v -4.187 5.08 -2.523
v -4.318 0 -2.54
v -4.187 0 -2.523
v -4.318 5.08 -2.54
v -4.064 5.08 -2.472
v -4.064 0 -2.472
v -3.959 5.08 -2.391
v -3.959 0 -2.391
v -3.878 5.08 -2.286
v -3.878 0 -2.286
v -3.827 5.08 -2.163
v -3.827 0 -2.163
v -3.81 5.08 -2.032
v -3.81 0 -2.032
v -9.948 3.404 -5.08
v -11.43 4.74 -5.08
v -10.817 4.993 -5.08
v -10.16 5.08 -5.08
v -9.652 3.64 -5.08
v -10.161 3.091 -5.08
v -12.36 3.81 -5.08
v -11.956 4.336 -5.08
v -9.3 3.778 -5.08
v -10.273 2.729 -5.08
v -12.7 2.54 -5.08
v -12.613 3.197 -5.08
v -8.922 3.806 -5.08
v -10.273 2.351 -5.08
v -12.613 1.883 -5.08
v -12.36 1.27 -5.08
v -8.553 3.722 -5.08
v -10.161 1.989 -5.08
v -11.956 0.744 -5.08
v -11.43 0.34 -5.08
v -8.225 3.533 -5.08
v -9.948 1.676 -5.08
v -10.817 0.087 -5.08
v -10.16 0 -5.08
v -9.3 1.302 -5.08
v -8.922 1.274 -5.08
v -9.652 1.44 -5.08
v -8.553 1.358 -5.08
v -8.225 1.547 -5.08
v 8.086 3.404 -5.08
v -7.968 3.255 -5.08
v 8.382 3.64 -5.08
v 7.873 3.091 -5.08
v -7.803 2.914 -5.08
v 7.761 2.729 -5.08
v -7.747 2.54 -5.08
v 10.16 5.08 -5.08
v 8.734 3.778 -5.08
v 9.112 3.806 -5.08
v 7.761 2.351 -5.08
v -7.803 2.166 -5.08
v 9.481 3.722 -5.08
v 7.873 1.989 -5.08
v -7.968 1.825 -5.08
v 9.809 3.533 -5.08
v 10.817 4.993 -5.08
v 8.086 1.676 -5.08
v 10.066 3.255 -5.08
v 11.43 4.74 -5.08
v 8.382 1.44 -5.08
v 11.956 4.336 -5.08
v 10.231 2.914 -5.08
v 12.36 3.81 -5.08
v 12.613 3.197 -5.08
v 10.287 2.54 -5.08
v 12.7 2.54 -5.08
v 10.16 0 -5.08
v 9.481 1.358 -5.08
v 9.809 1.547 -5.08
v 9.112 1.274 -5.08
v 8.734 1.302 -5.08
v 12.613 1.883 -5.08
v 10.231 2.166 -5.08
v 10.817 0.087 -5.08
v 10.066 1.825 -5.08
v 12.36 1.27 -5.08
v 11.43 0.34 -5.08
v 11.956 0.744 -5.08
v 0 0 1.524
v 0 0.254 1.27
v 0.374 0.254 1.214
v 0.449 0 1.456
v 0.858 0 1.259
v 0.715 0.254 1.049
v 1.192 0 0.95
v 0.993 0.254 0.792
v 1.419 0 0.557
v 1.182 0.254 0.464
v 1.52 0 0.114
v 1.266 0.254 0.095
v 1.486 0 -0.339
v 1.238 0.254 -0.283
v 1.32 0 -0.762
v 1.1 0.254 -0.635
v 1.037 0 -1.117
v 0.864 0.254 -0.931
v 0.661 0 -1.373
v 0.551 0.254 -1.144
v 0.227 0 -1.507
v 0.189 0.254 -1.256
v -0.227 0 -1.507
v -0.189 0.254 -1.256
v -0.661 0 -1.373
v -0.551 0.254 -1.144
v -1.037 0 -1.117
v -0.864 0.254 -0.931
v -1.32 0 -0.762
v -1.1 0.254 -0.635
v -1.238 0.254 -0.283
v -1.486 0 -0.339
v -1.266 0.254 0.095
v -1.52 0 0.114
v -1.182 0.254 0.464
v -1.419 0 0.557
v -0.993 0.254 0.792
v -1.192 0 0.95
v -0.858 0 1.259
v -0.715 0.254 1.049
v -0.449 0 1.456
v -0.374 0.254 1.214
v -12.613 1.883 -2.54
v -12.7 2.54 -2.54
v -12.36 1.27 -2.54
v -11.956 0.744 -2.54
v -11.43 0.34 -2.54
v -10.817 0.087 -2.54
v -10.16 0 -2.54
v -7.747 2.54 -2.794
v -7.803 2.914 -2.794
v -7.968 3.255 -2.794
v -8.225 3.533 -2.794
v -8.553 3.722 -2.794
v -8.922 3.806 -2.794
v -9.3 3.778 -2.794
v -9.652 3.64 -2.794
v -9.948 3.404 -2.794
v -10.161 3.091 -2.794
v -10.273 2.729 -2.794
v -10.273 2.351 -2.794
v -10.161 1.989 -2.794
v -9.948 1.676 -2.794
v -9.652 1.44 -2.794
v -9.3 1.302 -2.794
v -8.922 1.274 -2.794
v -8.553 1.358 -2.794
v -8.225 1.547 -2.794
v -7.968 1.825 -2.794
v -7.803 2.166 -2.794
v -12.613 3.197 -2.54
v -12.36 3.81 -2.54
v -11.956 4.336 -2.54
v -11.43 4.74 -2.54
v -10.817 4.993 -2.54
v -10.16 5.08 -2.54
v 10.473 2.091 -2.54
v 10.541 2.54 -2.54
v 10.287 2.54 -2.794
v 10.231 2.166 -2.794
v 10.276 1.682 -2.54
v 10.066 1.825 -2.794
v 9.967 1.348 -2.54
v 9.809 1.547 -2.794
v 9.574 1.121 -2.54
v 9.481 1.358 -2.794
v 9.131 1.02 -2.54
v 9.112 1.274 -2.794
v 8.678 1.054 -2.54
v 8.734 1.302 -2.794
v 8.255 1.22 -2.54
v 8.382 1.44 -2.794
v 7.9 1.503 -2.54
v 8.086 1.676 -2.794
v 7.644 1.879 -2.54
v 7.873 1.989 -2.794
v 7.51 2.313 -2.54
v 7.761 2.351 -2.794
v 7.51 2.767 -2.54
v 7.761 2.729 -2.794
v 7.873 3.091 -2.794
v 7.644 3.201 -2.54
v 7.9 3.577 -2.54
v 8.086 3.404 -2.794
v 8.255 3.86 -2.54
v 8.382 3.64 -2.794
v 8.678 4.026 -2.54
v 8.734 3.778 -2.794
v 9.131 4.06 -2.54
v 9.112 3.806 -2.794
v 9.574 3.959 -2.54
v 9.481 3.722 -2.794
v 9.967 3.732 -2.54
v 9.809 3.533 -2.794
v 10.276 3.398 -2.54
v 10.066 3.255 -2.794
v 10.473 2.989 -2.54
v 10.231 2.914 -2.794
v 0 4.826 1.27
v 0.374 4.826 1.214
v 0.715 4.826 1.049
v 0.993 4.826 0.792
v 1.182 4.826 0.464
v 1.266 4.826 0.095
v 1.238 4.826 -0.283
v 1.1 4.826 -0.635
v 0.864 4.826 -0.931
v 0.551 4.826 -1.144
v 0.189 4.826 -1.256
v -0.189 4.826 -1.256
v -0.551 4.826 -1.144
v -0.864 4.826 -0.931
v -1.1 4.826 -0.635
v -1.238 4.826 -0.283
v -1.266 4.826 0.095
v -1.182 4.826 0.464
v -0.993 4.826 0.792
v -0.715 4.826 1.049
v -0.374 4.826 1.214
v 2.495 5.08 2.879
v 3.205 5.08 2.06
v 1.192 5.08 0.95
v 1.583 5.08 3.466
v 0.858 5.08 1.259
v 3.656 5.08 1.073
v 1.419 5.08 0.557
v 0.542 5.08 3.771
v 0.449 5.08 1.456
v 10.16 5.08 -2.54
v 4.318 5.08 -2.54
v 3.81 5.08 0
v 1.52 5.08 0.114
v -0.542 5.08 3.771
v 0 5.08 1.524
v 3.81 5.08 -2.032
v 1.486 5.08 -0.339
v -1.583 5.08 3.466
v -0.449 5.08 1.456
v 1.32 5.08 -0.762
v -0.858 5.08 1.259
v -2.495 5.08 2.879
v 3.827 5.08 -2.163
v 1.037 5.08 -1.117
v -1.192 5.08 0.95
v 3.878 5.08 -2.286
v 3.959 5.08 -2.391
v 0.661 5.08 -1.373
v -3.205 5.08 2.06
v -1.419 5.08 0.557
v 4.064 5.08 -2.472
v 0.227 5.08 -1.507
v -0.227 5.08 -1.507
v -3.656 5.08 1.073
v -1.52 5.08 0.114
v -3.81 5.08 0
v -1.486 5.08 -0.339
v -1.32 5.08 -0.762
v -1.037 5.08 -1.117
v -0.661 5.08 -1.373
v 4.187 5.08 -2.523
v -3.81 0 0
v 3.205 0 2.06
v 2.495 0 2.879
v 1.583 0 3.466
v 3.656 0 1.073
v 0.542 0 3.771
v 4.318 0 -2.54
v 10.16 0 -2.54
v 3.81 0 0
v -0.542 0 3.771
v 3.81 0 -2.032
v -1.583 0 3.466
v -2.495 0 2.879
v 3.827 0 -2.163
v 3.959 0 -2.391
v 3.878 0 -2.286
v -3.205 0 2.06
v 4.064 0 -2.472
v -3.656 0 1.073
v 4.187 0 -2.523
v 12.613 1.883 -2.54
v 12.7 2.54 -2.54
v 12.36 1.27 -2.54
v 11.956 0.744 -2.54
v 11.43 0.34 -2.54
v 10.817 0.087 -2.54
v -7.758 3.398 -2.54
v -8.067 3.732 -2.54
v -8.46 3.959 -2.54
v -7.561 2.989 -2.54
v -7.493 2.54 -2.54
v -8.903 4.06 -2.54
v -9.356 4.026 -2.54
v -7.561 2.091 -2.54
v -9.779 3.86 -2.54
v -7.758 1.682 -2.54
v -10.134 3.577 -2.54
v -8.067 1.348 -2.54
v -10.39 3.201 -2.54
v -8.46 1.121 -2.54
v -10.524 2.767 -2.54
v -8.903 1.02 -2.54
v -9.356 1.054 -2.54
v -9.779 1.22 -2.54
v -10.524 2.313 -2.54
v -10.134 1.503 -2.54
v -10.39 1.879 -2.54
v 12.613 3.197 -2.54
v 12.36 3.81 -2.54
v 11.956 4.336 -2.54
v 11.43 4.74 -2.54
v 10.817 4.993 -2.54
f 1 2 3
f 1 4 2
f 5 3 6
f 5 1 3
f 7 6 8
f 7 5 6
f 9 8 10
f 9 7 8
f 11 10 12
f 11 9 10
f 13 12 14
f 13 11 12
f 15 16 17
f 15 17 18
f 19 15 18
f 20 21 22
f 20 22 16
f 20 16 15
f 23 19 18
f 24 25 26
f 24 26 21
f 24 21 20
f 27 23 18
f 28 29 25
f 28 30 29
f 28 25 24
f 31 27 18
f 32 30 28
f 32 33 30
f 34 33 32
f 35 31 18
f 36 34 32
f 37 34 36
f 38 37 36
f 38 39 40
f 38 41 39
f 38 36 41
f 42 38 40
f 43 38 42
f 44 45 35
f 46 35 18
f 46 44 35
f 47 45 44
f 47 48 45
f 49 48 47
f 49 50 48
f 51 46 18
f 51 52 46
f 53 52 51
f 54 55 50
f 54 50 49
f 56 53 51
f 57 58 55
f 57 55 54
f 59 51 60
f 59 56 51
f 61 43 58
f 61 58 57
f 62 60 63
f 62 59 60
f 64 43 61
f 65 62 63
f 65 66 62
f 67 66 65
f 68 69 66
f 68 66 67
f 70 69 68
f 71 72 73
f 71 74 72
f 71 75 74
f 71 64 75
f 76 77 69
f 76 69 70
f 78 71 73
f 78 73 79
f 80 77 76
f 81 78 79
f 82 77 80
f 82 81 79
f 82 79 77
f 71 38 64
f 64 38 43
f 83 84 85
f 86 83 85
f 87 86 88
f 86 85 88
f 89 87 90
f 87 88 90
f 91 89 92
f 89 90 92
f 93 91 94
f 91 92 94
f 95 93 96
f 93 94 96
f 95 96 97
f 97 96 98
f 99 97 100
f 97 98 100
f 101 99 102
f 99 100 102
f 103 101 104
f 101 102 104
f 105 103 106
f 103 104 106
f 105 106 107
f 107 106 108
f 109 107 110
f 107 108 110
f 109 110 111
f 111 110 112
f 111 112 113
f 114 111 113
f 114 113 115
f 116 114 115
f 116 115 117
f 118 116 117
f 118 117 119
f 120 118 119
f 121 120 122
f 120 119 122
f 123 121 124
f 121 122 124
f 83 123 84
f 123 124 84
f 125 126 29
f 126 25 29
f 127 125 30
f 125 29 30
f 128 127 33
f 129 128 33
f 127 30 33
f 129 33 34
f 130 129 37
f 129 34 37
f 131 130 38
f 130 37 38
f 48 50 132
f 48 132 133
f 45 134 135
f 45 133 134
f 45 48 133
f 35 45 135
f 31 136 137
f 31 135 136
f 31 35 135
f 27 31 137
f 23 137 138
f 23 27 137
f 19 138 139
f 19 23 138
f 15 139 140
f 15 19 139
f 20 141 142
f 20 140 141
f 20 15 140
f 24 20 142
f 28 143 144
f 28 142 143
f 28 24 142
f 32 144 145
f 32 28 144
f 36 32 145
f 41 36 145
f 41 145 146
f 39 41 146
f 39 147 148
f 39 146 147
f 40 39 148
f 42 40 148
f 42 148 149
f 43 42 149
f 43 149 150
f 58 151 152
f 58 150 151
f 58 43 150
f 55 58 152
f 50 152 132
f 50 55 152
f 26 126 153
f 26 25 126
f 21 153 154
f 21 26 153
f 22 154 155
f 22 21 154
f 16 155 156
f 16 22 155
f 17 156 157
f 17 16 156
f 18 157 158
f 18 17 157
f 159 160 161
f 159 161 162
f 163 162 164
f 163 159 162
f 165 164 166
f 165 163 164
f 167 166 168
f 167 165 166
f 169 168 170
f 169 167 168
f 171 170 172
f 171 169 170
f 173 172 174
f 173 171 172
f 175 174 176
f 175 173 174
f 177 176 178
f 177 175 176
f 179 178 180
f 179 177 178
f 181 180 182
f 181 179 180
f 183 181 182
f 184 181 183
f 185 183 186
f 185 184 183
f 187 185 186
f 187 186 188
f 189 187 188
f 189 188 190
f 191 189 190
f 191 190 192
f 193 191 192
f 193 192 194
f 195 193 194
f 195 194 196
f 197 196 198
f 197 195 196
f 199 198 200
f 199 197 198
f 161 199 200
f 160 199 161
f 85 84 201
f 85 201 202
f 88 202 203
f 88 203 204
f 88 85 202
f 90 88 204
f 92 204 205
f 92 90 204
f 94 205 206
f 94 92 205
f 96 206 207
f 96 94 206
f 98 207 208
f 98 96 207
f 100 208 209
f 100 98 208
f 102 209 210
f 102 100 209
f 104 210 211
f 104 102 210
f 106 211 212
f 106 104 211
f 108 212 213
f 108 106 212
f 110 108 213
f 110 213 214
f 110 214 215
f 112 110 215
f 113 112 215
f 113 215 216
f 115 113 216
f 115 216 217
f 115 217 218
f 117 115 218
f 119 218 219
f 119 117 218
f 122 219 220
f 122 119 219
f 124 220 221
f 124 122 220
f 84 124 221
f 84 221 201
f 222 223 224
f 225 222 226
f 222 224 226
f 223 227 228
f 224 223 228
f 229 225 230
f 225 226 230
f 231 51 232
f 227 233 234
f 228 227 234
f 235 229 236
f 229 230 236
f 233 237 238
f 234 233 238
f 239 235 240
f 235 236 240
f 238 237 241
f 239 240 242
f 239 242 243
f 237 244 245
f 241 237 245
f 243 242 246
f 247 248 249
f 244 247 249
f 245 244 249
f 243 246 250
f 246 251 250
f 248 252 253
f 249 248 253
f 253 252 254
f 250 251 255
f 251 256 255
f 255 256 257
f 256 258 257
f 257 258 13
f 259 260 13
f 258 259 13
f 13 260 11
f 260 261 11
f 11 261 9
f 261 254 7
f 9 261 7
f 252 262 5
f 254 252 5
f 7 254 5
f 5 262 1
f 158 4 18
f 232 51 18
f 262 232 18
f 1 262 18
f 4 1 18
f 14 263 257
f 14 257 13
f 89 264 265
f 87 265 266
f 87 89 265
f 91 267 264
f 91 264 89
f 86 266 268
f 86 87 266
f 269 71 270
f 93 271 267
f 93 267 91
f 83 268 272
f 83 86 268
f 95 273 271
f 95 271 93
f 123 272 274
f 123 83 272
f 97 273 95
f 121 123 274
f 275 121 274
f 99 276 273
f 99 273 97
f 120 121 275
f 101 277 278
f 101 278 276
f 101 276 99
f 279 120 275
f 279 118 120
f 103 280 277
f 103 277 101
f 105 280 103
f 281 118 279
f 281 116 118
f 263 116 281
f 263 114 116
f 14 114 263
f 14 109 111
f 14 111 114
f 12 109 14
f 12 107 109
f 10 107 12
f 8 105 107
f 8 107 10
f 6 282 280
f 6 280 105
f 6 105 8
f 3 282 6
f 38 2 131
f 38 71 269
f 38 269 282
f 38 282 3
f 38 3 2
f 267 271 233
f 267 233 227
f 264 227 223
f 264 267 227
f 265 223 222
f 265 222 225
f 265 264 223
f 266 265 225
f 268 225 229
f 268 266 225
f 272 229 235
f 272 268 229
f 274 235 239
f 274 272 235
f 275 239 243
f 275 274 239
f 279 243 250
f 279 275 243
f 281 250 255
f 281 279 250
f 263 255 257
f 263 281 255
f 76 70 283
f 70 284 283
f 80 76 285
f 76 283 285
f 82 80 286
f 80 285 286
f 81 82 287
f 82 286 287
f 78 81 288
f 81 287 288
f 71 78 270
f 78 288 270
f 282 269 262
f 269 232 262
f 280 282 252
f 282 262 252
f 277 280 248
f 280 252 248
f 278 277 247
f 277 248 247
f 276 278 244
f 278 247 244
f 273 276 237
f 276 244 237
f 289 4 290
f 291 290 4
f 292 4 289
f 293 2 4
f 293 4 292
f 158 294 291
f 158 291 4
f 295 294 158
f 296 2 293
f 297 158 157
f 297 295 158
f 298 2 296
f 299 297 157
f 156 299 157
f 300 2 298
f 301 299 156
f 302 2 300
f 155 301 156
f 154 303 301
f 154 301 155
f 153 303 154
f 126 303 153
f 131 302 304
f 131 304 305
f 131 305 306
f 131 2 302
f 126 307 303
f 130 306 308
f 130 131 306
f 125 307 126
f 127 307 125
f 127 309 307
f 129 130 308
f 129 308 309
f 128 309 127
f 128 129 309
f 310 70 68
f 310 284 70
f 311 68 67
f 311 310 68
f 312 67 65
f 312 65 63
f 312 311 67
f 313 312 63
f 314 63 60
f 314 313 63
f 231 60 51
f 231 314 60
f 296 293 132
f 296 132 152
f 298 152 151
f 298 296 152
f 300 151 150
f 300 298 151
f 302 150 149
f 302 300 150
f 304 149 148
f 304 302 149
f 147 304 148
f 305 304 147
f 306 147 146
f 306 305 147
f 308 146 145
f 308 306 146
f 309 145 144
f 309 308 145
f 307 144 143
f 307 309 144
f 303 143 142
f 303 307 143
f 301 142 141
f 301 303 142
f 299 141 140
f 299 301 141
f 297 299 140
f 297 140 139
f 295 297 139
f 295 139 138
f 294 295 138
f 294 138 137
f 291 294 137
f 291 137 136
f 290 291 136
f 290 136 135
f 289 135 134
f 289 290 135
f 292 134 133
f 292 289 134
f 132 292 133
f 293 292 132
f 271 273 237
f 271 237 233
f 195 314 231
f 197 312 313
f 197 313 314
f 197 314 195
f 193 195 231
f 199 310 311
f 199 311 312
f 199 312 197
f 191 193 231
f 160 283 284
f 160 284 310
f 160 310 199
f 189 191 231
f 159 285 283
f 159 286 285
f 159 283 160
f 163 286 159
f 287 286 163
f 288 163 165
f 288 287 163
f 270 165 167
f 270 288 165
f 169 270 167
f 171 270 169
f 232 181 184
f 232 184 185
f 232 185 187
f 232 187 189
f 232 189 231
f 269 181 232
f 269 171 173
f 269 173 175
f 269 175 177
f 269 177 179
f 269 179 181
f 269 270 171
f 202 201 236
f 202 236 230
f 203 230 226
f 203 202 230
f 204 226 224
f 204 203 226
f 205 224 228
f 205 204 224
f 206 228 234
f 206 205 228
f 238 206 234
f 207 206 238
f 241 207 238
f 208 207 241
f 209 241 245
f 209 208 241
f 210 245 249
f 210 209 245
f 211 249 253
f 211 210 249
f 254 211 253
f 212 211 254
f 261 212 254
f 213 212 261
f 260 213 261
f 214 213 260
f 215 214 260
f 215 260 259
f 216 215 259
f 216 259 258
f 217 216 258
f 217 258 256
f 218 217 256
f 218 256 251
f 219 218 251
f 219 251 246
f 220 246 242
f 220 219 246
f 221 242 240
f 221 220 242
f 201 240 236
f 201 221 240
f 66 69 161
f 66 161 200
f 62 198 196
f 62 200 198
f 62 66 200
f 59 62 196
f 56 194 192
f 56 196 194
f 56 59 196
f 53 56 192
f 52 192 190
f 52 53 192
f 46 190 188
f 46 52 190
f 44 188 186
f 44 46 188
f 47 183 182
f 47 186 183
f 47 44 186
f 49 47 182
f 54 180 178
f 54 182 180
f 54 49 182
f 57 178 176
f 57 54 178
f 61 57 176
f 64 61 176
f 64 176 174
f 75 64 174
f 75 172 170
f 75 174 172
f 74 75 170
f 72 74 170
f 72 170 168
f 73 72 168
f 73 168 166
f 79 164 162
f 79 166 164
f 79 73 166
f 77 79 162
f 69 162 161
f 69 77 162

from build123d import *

# Parameters (mm, degrees)
SKETCH1_R               = 1.27
BOSS_EXTRUDE1_DEPTH     = 5.08
FILLET1_R               = 2.54
CUT_EXTRUDE1_DEPTH      = 16.080414451
CUT_EXTRUDE1_DEPTH_BACK = 16.080414451
SKETCH2_R               = 1.27
CHAMFER1_SIZE           = 0.254
FILLET2_R               = 0.508


with BuildPart() as part:
    # Sketch1 → Boss-Extrude1 (new body)
    with BuildSketch(Plane(origin=(0, 0, 0), x_dir=(1, 0, 0), z_dir=(0, 1, 0))):
        with BuildLine():
            Line((-12.7, 5.08), (12.7, 5.08))
            Line((12.7, 5.08), (12.7, 2.54))
            Line((12.7, 2.54), (3.81, 2.54))
            Line((3.81, 2.54), (3.81, 0))
            ThreePointArc((3.81, 0), (0, -3.81), (-3.81, 0))
            Line((-3.81, 0), (-3.81, 2.54))
            Line((-3.81, 2.54), (-12.7, 2.54))
            Line((-12.7, 2.54), (-12.7, 5.08))
        make_face()
        with Locations(Location((0, 0, 0), (0, 0, 270))):
            Circle(SKETCH1_R, mode=Mode.SUBTRACT)
    extrude(amount=BOSS_EXTRUDE1_DEPTH)

    # Fillet1
    fillet1_edges = [part.edges().sort_by_distance(p)[0] for p in [
        (-12.7, 5.08, -3.81),
        (-12.7, 0, -3.81),
        (12.7, 5.08, -3.81),
        (12.7, 0, -3.81),
    ]]
    fillet(fillet1_edges, radius=FILLET1_R - 0.0001)  # a hair under: the kernel refuses the full size

    # Sketch2 → Cut-Extrude1 (cut, two sides: drawn at the far end of the back side and taken through both)
    with BuildSketch(Plane.XY.offset(-2.54).offset(-CUT_EXTRUDE1_DEPTH_BACK)):
        with Locations((-9.017, 2.54)):
            Circle(SKETCH2_R)
        with Locations((9.017, 2.54)):
            Circle(SKETCH2_R)
    extrude(amount=CUT_EXTRUDE1_DEPTH + CUT_EXTRUDE1_DEPTH_BACK, mode=Mode.SUBTRACT)

    # Chamfer1
    chamfer1_edges = [part.edges().sort_by_distance(p)[0] for p in [
        (0, 0, -1.27),
        (0, 5.08, -1.27),
        (-10.287, 2.54, -2.54),
        (7.747, 2.54, -2.54),
    ]]
    chamfer(chamfer1_edges, length=CHAMFER1_SIZE)

    # Fillet2
    fillet2_edges = [part.edges().sort_by_distance(p)[0] for p in [
        (3.81, 2.54, -2.54),
        (-3.81, 2.54, -2.54),
    ]]
    fillet(fillet2_edges, radius=FILLET2_R)


solid = part.part
